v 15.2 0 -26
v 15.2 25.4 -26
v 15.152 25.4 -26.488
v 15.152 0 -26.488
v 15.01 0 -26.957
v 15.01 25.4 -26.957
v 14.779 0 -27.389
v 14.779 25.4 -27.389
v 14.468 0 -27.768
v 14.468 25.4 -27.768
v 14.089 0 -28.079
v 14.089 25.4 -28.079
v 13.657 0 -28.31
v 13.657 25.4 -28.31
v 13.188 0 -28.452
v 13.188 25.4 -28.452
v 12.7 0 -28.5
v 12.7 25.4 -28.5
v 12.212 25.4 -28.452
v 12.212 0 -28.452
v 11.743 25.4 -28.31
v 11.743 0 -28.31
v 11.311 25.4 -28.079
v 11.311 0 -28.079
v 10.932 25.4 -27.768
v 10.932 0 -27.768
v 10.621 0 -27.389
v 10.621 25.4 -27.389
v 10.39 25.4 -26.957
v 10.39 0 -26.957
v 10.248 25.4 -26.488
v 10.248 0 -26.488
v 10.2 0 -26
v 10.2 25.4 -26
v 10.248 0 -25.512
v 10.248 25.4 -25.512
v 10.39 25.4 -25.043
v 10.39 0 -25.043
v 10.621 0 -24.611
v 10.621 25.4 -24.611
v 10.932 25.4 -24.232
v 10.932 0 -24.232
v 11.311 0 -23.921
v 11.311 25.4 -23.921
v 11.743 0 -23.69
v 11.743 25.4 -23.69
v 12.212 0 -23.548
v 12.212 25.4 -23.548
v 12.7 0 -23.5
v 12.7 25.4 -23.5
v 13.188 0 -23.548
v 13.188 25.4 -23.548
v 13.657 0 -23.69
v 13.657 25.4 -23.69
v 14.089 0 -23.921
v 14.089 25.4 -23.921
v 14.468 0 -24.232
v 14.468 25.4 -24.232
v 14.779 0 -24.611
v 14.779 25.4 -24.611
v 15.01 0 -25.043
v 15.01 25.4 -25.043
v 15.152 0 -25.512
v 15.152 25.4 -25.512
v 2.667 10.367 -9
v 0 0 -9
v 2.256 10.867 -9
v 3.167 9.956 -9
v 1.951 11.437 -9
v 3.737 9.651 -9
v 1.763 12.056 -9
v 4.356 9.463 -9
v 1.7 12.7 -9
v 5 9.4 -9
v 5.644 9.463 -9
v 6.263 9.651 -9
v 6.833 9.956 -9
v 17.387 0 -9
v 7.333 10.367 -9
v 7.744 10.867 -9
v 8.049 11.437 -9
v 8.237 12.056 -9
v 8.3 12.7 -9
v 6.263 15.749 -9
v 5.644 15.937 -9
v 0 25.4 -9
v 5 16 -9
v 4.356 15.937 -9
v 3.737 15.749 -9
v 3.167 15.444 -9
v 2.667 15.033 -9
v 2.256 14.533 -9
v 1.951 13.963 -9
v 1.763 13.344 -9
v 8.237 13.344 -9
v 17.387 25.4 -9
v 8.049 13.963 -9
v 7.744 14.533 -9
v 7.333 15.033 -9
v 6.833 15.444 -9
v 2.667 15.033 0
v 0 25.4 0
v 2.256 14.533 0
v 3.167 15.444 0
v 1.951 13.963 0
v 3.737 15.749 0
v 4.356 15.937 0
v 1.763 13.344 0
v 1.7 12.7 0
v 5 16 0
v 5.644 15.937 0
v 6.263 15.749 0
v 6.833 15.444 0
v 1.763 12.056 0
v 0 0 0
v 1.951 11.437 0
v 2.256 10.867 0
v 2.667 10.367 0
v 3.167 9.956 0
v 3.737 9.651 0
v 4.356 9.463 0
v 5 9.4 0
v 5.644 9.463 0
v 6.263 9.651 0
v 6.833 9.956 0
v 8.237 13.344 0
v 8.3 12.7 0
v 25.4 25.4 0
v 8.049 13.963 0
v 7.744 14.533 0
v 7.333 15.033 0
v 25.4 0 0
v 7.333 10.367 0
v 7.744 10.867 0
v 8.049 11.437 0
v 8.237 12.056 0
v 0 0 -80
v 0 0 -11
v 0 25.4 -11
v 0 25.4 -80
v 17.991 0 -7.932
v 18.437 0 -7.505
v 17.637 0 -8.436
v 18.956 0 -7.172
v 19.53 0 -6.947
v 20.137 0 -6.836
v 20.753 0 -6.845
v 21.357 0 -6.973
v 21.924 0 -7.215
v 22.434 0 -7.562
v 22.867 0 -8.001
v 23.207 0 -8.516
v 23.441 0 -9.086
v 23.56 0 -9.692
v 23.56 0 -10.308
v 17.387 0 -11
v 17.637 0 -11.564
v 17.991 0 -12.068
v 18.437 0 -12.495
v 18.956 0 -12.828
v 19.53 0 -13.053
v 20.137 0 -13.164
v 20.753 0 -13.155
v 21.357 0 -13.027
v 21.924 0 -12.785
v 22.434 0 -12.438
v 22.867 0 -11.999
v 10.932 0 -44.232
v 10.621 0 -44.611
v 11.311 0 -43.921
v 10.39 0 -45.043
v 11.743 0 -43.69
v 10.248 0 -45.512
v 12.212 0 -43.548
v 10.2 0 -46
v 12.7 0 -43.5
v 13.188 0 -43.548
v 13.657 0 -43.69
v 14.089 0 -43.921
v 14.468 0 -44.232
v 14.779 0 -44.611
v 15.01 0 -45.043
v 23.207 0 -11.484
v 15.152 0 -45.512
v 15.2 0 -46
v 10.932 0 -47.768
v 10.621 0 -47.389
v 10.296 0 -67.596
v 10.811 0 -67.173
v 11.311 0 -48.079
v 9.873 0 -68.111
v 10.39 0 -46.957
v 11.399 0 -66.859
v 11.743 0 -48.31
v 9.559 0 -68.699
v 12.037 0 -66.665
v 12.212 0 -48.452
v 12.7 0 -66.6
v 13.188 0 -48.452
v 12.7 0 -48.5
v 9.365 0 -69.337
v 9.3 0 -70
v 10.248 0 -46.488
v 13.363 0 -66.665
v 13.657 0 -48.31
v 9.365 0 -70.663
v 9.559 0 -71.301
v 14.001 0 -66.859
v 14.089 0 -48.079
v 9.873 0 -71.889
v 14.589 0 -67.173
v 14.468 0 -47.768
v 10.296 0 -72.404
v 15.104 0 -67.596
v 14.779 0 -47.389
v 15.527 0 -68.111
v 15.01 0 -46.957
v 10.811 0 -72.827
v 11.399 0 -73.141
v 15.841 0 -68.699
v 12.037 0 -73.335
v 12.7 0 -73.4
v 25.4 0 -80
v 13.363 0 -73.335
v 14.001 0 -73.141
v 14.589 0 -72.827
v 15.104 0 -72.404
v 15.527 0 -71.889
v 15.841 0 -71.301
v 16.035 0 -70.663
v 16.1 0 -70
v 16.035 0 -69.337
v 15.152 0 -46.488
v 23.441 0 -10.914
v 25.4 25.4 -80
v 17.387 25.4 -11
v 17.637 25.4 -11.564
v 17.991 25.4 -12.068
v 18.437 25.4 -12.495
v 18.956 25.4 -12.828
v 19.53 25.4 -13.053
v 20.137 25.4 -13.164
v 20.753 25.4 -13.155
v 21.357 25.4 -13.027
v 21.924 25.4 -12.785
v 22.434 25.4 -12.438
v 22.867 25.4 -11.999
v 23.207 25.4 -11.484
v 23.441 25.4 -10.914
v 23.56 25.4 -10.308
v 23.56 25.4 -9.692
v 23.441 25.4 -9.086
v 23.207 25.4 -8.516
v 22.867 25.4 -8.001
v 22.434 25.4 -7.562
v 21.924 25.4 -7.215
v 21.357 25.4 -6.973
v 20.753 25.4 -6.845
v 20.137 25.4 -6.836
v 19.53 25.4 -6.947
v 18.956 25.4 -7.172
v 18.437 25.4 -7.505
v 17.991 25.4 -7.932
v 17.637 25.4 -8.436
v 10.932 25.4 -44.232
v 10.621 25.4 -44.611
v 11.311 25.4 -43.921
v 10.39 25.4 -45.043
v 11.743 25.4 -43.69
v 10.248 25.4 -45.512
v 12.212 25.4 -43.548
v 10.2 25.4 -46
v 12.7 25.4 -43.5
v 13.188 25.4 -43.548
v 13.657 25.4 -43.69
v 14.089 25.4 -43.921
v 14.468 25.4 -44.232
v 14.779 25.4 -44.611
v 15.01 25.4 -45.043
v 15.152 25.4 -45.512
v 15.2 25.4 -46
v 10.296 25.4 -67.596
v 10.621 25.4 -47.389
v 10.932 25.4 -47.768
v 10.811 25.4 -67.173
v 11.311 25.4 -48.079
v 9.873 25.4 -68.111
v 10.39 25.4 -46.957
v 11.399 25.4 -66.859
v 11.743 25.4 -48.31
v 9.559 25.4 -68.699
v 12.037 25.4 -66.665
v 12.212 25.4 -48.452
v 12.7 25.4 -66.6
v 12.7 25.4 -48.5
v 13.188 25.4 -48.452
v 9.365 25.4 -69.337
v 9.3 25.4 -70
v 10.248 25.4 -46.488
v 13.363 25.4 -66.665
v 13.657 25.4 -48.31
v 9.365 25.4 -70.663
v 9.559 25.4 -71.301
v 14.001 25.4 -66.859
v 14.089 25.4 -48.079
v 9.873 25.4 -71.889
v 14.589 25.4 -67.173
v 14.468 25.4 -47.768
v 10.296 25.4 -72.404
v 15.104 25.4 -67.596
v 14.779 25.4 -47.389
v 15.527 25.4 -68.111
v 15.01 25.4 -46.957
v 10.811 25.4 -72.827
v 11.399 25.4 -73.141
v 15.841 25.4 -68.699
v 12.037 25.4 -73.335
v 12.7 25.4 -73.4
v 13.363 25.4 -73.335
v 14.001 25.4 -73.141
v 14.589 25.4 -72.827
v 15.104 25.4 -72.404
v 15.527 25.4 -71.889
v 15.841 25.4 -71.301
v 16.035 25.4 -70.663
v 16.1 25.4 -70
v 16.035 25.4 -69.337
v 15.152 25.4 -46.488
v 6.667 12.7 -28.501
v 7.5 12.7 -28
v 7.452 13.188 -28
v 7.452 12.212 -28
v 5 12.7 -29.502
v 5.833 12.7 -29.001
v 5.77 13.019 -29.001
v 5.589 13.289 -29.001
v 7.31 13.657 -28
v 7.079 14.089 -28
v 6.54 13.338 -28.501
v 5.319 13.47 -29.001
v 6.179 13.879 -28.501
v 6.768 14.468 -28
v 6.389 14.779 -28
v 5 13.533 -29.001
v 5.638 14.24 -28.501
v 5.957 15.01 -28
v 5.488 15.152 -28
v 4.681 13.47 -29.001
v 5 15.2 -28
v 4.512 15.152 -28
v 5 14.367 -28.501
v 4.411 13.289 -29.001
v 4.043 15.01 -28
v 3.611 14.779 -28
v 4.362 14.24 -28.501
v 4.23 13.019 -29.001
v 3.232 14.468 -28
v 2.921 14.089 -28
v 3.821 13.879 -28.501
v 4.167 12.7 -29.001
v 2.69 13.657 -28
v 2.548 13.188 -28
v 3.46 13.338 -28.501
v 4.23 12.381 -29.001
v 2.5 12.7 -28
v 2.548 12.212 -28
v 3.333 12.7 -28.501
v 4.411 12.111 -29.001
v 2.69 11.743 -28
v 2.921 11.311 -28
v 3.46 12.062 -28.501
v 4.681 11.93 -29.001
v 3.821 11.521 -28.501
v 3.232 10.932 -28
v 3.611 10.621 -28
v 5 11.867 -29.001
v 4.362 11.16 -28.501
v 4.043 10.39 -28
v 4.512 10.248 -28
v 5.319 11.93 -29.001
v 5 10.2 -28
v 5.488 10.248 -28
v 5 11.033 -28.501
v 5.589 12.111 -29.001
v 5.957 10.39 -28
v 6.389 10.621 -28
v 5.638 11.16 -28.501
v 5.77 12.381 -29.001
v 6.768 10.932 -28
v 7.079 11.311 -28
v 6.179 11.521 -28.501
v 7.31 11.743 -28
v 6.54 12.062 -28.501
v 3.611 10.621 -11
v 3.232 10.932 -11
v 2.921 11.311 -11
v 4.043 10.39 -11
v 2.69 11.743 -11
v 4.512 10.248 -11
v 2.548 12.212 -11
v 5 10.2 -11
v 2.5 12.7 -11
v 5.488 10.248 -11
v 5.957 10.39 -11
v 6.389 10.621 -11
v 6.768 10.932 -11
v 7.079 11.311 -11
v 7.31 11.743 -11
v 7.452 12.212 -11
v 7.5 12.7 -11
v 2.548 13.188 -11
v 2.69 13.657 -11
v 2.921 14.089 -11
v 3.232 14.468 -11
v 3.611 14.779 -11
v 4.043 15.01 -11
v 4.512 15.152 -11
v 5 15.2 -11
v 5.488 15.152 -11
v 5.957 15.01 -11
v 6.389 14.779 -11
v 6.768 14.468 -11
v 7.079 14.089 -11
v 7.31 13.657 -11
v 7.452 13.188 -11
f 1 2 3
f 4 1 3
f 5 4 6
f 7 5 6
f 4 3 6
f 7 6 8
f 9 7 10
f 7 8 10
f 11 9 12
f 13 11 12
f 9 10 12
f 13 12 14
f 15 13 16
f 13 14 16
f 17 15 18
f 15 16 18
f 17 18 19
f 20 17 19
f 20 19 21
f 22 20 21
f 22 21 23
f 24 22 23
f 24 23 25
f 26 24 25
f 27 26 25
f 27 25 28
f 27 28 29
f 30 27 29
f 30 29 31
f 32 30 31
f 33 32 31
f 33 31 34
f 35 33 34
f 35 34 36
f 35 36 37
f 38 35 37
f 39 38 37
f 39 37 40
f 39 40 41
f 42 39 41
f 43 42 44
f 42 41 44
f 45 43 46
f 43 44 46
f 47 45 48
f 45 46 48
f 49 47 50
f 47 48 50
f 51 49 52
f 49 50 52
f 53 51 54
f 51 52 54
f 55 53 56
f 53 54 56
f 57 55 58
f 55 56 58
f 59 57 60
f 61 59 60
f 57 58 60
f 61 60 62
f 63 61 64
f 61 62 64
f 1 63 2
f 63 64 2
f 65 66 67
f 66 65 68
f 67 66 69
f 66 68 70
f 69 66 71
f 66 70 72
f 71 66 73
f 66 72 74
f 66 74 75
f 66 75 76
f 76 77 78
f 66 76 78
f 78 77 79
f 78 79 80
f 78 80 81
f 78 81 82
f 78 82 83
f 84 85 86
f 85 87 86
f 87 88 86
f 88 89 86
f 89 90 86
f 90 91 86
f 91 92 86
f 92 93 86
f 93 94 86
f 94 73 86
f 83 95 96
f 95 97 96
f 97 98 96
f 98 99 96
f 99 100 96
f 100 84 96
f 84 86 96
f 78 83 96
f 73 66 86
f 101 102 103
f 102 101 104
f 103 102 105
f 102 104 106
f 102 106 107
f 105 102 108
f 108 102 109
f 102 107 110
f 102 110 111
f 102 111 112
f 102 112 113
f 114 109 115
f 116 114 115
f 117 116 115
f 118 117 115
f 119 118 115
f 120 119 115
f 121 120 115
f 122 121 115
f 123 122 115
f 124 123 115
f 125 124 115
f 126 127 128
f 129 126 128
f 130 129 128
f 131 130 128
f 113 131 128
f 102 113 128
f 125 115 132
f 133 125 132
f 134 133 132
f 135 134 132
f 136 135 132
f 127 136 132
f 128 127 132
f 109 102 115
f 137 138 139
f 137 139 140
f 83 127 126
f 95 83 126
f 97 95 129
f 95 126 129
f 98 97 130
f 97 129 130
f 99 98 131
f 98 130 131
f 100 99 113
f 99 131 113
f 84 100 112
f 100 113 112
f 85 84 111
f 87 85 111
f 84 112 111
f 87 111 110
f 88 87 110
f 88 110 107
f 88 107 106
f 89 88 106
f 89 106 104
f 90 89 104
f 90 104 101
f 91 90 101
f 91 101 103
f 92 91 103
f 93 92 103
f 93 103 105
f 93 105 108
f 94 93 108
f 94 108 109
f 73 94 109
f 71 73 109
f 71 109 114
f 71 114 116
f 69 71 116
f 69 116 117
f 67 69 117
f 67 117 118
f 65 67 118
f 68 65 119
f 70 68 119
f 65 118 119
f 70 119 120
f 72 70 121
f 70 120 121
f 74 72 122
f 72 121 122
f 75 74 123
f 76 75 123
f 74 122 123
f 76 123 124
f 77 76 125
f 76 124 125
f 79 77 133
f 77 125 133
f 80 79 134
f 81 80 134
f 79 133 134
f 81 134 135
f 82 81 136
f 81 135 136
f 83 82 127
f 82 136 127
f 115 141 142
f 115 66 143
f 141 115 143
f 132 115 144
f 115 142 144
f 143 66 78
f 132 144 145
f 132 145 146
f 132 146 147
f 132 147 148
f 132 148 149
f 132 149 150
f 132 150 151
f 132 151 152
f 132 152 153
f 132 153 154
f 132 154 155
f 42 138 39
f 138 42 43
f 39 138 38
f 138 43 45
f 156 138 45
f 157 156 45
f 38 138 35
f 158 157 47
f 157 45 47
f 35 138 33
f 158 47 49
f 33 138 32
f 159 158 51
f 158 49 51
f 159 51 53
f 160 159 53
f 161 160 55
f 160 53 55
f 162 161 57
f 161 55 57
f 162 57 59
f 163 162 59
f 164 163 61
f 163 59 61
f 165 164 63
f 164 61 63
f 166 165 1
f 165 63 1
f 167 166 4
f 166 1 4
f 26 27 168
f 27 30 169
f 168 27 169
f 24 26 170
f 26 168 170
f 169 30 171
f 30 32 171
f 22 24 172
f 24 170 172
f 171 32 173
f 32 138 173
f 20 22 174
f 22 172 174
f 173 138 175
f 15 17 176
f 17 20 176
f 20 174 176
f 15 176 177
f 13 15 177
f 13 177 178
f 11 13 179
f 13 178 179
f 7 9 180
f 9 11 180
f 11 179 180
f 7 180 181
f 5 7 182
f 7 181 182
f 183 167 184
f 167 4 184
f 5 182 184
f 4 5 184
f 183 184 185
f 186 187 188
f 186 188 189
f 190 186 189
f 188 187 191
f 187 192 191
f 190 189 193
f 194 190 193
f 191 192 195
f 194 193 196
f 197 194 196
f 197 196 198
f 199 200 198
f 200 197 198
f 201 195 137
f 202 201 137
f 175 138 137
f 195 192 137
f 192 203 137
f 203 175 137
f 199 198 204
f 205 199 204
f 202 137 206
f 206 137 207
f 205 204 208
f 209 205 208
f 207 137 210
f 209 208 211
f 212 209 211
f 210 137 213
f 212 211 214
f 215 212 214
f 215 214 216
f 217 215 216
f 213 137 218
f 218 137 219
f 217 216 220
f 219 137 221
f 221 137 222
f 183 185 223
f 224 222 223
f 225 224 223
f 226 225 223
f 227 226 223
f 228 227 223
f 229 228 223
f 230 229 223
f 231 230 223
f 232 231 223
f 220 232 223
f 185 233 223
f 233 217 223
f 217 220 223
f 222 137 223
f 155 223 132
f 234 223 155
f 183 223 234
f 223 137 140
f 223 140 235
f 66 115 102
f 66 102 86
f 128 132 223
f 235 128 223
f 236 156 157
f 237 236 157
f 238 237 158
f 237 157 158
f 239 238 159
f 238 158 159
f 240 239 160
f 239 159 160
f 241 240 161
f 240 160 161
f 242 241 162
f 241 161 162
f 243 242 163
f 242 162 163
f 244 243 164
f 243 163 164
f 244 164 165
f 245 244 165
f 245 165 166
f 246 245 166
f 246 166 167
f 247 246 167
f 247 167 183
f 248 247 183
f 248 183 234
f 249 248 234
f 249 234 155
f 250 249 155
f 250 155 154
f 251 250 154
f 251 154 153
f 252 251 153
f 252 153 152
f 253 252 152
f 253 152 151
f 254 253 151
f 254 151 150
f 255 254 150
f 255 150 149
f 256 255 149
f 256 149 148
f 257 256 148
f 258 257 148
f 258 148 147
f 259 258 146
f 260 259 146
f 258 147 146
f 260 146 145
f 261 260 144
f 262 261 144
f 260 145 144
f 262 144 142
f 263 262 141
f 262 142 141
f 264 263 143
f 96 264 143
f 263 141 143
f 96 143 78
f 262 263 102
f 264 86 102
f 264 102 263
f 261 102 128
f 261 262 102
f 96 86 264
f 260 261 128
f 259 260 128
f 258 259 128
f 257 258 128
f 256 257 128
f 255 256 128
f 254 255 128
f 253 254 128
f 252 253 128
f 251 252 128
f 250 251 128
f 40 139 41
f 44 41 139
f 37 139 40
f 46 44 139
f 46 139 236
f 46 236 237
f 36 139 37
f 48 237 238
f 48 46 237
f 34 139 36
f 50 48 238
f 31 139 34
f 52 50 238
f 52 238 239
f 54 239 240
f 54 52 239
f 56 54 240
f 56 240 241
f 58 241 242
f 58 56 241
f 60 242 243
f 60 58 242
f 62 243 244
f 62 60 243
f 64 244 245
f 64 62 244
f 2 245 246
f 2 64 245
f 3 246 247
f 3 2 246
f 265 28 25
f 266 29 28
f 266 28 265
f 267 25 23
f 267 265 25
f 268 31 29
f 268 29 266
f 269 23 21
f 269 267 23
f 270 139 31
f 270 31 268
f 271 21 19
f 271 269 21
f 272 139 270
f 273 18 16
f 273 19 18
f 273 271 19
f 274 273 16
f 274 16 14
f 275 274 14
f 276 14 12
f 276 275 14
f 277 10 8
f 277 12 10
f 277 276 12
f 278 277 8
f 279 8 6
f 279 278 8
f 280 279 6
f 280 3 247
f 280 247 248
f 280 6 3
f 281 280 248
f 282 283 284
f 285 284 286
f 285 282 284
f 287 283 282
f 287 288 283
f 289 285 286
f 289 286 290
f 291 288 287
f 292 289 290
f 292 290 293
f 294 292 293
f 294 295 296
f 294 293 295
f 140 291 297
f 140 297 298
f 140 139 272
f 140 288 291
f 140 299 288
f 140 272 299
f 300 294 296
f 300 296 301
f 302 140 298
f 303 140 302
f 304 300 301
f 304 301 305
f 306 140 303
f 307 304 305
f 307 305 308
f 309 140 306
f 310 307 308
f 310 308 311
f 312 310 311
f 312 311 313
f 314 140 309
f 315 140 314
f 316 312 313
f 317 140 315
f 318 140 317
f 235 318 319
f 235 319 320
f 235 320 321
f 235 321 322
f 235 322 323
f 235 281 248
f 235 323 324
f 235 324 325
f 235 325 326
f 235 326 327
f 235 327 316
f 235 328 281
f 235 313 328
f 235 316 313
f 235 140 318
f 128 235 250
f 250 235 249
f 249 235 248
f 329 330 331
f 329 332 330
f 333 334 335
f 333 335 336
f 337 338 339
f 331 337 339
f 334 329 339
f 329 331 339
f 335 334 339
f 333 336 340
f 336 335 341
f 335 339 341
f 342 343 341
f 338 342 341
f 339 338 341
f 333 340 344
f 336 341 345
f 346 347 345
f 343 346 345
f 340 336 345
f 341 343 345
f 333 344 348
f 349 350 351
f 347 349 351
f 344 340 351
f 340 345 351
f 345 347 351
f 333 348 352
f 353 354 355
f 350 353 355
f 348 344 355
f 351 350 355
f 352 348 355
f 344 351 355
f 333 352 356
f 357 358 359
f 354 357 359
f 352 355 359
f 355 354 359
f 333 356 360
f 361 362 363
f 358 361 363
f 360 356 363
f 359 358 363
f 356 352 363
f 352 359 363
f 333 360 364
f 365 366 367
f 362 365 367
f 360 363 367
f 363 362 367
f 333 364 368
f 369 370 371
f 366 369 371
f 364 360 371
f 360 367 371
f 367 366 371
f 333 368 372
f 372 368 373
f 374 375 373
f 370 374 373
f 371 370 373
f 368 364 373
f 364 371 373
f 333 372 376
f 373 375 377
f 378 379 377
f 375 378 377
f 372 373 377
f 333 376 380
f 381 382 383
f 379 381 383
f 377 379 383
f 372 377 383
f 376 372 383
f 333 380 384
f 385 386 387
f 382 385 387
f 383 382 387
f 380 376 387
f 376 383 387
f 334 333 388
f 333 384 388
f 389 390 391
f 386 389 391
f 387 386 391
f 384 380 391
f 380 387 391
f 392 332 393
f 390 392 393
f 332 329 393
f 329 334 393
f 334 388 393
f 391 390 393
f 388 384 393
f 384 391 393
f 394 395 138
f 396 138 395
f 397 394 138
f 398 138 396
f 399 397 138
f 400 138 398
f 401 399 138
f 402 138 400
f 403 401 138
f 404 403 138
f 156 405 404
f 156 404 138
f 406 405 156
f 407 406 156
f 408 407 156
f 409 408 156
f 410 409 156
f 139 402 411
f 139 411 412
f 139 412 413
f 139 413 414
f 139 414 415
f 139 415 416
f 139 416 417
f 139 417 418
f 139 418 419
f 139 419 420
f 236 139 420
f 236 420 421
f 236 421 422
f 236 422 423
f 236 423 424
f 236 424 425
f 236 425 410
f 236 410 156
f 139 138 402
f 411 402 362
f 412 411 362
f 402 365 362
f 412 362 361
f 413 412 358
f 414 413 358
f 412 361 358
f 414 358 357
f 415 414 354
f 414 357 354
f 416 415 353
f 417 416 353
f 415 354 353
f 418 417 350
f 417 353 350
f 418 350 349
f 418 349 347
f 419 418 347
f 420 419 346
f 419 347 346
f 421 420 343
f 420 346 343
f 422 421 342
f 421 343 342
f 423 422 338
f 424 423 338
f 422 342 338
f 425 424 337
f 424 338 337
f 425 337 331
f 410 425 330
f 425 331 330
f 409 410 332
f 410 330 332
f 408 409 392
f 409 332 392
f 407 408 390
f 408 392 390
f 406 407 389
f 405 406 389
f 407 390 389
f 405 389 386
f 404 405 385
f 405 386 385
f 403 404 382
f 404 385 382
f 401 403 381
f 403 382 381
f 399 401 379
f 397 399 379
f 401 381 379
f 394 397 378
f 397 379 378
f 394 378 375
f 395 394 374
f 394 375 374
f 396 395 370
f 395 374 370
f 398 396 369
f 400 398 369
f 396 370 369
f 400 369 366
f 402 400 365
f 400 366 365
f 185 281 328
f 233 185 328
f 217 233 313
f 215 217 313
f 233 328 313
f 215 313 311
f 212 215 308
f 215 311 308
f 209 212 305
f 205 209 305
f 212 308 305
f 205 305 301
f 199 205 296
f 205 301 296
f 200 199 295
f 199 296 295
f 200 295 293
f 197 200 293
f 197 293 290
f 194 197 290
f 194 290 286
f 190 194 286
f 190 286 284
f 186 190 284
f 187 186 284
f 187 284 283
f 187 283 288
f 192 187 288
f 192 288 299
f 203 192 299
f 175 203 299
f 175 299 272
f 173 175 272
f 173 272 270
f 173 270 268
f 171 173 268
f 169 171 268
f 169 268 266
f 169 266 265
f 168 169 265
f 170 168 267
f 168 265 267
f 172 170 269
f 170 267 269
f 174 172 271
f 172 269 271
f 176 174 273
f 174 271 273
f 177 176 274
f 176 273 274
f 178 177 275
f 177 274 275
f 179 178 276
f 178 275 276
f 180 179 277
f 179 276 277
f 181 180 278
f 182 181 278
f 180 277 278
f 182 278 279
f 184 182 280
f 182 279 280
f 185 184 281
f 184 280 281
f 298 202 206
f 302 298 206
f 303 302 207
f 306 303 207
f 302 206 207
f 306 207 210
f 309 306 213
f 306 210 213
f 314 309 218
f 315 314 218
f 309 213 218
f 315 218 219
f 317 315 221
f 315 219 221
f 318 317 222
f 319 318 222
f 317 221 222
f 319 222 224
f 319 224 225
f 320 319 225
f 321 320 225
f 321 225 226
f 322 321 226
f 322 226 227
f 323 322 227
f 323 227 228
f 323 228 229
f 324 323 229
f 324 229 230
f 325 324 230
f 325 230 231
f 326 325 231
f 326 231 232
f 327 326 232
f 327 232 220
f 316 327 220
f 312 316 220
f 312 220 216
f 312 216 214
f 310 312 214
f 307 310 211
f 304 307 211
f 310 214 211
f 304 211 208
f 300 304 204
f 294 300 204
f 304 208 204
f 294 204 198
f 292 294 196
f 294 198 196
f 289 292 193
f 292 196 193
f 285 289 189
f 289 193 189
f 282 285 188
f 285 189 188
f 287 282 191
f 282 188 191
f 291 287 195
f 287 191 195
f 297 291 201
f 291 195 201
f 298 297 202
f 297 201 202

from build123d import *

# Parameters (mm, degrees)
SKETCH1_W                   = 25.4
SKETCH1_H                   = 80
BOSS_EXTRUDE1_DEPTH         = 25.4
F_1_4_0_25_DIAMETER_HOLE1_D = 6.35
SKETCH4_W                   = 20.4
SKETCH4_H                   = 2
CUT_EXTRUDE1_DEPTH          = 88.694469609
M6_CLEARANCE_HOLE1_REACH    = 89.694
M6_CLEARANCE_HOLE1_BORE_R   = 3.3
M6X1_0_TAPPED_HOLE1_D       = 5
M6X1_0_TAPPED_HOLE1_DEPTH   = 17
M6X1_0_TAPPED_HOLE1_TIP     = 1.502151548
M8X1_25_TAPPED_HOLE1_D      = 6.8
M6X1_0_TAPPED_HOLE2_D       = 5


with BuildPart() as part:
    # Sketch1 → Boss-Extrude1 (new body)
    with BuildSketch(Plane(origin=(0, 0, 0), x_dir=(1, 0, 0), z_dir=(0, 1, 0))):
        with Locations((12.7, 40)):
            Rectangle(SKETCH1_W, SKETCH1_H)
    extrude(amount=BOSS_EXTRUDE1_DEPTH)

    # 1/4 (0.25) Diameter Hole1 (through all)
    with Locations(Plane(origin=(0, 25.4, 0), x_dir=(1, 0, 0), z_dir=(0, 1, 0))):
        with Locations((20.4, 10)):
            Hole(F_1_4_0_25_DIAMETER_HOLE1_D / 2)

    # Sketch4 → Cut-Extrude1 (cut, through all)
    with BuildSketch(Plane(origin=(0, 25.4, 0), x_dir=(1, 0, 0), z_dir=(0, 1, 0))):
        with Locations((10.2, 10)):
            Rectangle(SKETCH4_W, SKETCH4_H)
    extrude(amount=-CUT_EXTRUDE1_DEPTH, mode=Mode.SUBTRACT)

    # M6 Clearance Hole1 bore → M6 Clearance Hole1 (cut, up to next)
    with BuildSketch(Plane.XY, mode=Mode.PRIVATE) as m6_clearance_hole1_sk1:
        with Locations((5, 12.7)):
            Circle(M6_CLEARANCE_HOLE1_BORE_R)
    m6_clearance_hole1_tool1 = extrude(m6_clearance_hole1_sk1.sketch, amount=-M6_CLEARANCE_HOLE1_REACH, mode=Mode.PRIVATE) & part.part
    add(m6_clearance_hole1_tool1.solids().sort_by_distance((5, 12.7, 0))[0], mode=Mode.SUBTRACT)

    # M6x1.0 Tapped Hole1
    with Locations(Plane.XY.offset(-11)):
        with Locations((5, 12.7)):
            Hole(M6X1_0_TAPPED_HOLE1_D / 2, depth=M6X1_0_TAPPED_HOLE1_DEPTH)
            with Locations((0, 0, -(M6X1_0_TAPPED_HOLE1_DEPTH + M6X1_0_TAPPED_HOLE1_TIP / 2))):  # 118° drill point
                Cone(0, M6X1_0_TAPPED_HOLE1_D / 2, M6X1_0_TAPPED_HOLE1_TIP, mode=Mode.SUBTRACT)

    # M8x1.25 Tapped Hole1 (through all)
    with Locations(Plane(origin=(0, 25.4, 0), x_dir=(1, 0, 0), z_dir=(0, 1, 0))):
        with Locations((12.7, 70)):
            Hole(M8X1_25_TAPPED_HOLE1_D / 2)

    # M6x1.0 Tapped Hole2 (through all)
    with Locations(Plane(origin=(0, 0, 0), x_dir=(-1, 0, 0), z_dir=(0, -1, 0))):
        with Locations((-12.7, 26), (-12.7, 46)):
            Hole(M6X1_0_TAPPED_HOLE2_D / 2)


solid = part.part
